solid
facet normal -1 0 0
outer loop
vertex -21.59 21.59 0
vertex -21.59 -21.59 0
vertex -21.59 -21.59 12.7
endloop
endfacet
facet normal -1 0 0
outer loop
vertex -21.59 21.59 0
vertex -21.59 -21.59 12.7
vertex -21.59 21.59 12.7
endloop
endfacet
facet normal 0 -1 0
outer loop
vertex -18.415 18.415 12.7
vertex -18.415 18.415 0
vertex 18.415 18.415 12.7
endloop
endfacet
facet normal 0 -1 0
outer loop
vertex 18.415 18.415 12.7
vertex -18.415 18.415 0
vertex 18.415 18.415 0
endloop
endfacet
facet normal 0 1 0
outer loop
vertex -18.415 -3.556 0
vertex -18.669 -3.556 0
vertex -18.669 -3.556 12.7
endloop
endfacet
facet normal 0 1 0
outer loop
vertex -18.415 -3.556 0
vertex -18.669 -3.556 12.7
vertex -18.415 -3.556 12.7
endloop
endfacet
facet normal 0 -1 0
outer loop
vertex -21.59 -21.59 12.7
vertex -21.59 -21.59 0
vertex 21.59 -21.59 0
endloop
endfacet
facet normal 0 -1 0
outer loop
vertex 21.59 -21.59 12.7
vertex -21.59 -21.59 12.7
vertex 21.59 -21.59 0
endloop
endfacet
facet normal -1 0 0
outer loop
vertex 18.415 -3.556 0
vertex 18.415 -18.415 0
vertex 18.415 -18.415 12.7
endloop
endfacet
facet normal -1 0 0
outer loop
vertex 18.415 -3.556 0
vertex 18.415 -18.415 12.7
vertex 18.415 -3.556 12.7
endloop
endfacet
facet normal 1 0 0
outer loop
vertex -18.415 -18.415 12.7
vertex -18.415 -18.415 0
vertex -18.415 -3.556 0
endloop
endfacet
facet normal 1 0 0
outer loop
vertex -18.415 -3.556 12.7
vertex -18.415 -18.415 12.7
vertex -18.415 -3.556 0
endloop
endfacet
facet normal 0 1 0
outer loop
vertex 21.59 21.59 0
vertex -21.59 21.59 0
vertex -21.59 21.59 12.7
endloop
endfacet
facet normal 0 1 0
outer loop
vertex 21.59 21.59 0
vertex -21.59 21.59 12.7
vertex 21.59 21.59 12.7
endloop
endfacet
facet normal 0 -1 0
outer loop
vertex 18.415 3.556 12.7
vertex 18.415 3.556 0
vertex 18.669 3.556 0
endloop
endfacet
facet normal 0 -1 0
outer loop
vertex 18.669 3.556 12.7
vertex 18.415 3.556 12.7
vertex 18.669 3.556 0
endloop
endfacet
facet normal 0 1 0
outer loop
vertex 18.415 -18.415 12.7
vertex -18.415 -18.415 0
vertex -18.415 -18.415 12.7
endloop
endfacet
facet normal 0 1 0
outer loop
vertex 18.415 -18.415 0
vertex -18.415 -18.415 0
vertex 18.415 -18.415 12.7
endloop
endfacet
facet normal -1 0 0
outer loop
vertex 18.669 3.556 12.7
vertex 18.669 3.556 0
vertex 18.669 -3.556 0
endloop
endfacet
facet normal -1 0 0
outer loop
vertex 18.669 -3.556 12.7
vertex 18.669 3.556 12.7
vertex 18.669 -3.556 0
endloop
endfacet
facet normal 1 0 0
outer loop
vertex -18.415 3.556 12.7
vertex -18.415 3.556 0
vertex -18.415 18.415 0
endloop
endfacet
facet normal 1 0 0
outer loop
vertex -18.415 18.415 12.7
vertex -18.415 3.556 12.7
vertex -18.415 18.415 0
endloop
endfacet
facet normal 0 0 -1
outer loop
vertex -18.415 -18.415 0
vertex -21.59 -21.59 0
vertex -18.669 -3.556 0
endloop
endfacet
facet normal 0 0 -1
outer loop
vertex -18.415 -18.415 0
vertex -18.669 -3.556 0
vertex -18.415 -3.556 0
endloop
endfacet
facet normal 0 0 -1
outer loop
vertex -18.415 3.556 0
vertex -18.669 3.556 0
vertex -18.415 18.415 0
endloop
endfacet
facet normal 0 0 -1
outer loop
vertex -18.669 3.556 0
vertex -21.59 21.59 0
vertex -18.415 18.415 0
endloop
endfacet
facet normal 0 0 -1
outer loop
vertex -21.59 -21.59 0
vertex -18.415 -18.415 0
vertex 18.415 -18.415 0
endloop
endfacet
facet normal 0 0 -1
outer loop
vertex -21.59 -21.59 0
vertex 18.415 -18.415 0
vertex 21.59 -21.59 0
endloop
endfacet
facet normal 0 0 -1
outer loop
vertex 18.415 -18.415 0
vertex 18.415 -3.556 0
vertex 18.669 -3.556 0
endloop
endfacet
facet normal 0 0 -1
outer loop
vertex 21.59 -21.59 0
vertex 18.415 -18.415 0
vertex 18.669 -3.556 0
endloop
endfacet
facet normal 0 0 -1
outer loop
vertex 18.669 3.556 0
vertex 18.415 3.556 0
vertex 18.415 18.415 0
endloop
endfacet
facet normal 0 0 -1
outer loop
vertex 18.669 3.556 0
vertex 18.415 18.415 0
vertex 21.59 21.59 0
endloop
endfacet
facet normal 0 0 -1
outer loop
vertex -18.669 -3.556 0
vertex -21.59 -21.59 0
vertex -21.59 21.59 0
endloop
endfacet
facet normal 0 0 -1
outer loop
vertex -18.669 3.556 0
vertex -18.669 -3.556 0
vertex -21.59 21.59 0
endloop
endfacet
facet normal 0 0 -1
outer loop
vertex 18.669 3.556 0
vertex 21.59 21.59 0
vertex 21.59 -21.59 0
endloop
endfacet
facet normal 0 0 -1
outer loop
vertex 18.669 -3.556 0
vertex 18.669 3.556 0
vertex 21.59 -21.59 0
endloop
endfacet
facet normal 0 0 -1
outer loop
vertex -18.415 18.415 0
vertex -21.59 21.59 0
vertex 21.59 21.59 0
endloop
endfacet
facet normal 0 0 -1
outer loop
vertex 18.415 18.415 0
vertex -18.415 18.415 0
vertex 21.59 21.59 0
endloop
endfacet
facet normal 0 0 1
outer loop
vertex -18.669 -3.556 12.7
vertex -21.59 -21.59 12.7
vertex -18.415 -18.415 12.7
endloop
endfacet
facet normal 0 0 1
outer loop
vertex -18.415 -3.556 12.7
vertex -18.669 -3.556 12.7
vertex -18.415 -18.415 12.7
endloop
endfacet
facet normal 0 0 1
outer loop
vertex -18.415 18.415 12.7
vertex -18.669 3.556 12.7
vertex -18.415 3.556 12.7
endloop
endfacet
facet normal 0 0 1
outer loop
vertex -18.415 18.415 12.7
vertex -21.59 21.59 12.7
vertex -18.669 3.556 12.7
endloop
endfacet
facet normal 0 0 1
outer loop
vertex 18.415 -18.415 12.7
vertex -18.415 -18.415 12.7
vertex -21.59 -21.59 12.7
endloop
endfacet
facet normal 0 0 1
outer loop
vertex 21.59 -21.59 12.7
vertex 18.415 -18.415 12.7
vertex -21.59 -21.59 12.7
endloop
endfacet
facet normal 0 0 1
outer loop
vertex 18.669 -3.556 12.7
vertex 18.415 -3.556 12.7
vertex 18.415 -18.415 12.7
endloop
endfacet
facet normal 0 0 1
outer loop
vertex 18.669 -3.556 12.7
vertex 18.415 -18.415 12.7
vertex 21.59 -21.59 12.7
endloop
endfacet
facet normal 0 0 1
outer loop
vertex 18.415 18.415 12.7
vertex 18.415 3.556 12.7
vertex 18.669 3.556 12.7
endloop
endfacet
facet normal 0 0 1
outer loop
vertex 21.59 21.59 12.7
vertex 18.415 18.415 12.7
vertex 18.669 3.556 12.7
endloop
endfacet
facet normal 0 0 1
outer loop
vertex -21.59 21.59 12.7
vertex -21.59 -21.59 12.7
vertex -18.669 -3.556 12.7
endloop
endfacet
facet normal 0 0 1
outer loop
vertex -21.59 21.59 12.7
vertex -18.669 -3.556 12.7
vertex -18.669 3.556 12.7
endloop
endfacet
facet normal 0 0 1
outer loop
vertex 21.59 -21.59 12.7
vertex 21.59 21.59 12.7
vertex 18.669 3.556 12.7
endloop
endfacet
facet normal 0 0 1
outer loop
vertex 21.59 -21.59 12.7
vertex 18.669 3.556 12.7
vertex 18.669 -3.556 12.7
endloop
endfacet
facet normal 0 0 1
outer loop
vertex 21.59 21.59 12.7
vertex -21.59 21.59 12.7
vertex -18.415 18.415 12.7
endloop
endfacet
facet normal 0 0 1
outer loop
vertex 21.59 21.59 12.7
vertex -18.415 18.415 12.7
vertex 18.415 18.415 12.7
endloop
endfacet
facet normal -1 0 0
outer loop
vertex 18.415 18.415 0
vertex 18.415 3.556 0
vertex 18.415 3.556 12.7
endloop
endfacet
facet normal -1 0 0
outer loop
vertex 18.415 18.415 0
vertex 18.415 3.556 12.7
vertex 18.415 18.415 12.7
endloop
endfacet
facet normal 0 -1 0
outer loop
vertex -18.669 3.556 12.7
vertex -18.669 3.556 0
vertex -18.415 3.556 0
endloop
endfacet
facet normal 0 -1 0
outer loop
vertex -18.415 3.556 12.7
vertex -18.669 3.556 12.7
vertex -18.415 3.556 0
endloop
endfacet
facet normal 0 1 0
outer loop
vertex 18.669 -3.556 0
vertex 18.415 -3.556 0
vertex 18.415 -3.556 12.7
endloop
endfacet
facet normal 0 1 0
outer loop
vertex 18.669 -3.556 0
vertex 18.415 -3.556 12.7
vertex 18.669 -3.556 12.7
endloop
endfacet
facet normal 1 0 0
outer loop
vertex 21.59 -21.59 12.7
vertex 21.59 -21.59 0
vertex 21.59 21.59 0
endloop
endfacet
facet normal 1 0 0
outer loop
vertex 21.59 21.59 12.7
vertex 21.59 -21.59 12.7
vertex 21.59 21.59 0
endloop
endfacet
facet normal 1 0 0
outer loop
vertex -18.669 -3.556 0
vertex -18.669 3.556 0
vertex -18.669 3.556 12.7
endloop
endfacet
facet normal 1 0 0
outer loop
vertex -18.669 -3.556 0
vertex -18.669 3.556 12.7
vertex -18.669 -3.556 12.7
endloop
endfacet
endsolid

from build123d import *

# Parameters (mm, degrees)
F0_W     = 43.18
F0_H     = 43.18
F0_W_2   = 36.83
F0_H_2   = 36.83
F1_DEPTH = 12.7
F2_W     = 0.508
F2_H     = 7.112
F3_DEPTH = 12.701


with BuildPart() as f1:
    # F0 (on Top) → F1 (new body)
    with BuildSketch(Plane.XY):
        Rectangle(F0_W, F0_H)
        Rectangle(F0_W_2, F0_H_2, mode=Mode.SUBTRACT)
    extrude(amount=F1_DEPTH)

    # F2 (on face) → F3 (cut, through all)
    with BuildSketch(Plane(origin=(0, 0, 0), x_dir=(1, 0, 0), z_dir=(0, 0, -1))):
        with Locations((18.415, 0)):
            Rectangle(F2_W, F2_H)
        with Locations((-18.415, 0)):
            Rectangle(F2_W, F2_H)
    extrude(amount=-F3_DEPTH, mode=Mode.SUBTRACT)


solid = f1.part
